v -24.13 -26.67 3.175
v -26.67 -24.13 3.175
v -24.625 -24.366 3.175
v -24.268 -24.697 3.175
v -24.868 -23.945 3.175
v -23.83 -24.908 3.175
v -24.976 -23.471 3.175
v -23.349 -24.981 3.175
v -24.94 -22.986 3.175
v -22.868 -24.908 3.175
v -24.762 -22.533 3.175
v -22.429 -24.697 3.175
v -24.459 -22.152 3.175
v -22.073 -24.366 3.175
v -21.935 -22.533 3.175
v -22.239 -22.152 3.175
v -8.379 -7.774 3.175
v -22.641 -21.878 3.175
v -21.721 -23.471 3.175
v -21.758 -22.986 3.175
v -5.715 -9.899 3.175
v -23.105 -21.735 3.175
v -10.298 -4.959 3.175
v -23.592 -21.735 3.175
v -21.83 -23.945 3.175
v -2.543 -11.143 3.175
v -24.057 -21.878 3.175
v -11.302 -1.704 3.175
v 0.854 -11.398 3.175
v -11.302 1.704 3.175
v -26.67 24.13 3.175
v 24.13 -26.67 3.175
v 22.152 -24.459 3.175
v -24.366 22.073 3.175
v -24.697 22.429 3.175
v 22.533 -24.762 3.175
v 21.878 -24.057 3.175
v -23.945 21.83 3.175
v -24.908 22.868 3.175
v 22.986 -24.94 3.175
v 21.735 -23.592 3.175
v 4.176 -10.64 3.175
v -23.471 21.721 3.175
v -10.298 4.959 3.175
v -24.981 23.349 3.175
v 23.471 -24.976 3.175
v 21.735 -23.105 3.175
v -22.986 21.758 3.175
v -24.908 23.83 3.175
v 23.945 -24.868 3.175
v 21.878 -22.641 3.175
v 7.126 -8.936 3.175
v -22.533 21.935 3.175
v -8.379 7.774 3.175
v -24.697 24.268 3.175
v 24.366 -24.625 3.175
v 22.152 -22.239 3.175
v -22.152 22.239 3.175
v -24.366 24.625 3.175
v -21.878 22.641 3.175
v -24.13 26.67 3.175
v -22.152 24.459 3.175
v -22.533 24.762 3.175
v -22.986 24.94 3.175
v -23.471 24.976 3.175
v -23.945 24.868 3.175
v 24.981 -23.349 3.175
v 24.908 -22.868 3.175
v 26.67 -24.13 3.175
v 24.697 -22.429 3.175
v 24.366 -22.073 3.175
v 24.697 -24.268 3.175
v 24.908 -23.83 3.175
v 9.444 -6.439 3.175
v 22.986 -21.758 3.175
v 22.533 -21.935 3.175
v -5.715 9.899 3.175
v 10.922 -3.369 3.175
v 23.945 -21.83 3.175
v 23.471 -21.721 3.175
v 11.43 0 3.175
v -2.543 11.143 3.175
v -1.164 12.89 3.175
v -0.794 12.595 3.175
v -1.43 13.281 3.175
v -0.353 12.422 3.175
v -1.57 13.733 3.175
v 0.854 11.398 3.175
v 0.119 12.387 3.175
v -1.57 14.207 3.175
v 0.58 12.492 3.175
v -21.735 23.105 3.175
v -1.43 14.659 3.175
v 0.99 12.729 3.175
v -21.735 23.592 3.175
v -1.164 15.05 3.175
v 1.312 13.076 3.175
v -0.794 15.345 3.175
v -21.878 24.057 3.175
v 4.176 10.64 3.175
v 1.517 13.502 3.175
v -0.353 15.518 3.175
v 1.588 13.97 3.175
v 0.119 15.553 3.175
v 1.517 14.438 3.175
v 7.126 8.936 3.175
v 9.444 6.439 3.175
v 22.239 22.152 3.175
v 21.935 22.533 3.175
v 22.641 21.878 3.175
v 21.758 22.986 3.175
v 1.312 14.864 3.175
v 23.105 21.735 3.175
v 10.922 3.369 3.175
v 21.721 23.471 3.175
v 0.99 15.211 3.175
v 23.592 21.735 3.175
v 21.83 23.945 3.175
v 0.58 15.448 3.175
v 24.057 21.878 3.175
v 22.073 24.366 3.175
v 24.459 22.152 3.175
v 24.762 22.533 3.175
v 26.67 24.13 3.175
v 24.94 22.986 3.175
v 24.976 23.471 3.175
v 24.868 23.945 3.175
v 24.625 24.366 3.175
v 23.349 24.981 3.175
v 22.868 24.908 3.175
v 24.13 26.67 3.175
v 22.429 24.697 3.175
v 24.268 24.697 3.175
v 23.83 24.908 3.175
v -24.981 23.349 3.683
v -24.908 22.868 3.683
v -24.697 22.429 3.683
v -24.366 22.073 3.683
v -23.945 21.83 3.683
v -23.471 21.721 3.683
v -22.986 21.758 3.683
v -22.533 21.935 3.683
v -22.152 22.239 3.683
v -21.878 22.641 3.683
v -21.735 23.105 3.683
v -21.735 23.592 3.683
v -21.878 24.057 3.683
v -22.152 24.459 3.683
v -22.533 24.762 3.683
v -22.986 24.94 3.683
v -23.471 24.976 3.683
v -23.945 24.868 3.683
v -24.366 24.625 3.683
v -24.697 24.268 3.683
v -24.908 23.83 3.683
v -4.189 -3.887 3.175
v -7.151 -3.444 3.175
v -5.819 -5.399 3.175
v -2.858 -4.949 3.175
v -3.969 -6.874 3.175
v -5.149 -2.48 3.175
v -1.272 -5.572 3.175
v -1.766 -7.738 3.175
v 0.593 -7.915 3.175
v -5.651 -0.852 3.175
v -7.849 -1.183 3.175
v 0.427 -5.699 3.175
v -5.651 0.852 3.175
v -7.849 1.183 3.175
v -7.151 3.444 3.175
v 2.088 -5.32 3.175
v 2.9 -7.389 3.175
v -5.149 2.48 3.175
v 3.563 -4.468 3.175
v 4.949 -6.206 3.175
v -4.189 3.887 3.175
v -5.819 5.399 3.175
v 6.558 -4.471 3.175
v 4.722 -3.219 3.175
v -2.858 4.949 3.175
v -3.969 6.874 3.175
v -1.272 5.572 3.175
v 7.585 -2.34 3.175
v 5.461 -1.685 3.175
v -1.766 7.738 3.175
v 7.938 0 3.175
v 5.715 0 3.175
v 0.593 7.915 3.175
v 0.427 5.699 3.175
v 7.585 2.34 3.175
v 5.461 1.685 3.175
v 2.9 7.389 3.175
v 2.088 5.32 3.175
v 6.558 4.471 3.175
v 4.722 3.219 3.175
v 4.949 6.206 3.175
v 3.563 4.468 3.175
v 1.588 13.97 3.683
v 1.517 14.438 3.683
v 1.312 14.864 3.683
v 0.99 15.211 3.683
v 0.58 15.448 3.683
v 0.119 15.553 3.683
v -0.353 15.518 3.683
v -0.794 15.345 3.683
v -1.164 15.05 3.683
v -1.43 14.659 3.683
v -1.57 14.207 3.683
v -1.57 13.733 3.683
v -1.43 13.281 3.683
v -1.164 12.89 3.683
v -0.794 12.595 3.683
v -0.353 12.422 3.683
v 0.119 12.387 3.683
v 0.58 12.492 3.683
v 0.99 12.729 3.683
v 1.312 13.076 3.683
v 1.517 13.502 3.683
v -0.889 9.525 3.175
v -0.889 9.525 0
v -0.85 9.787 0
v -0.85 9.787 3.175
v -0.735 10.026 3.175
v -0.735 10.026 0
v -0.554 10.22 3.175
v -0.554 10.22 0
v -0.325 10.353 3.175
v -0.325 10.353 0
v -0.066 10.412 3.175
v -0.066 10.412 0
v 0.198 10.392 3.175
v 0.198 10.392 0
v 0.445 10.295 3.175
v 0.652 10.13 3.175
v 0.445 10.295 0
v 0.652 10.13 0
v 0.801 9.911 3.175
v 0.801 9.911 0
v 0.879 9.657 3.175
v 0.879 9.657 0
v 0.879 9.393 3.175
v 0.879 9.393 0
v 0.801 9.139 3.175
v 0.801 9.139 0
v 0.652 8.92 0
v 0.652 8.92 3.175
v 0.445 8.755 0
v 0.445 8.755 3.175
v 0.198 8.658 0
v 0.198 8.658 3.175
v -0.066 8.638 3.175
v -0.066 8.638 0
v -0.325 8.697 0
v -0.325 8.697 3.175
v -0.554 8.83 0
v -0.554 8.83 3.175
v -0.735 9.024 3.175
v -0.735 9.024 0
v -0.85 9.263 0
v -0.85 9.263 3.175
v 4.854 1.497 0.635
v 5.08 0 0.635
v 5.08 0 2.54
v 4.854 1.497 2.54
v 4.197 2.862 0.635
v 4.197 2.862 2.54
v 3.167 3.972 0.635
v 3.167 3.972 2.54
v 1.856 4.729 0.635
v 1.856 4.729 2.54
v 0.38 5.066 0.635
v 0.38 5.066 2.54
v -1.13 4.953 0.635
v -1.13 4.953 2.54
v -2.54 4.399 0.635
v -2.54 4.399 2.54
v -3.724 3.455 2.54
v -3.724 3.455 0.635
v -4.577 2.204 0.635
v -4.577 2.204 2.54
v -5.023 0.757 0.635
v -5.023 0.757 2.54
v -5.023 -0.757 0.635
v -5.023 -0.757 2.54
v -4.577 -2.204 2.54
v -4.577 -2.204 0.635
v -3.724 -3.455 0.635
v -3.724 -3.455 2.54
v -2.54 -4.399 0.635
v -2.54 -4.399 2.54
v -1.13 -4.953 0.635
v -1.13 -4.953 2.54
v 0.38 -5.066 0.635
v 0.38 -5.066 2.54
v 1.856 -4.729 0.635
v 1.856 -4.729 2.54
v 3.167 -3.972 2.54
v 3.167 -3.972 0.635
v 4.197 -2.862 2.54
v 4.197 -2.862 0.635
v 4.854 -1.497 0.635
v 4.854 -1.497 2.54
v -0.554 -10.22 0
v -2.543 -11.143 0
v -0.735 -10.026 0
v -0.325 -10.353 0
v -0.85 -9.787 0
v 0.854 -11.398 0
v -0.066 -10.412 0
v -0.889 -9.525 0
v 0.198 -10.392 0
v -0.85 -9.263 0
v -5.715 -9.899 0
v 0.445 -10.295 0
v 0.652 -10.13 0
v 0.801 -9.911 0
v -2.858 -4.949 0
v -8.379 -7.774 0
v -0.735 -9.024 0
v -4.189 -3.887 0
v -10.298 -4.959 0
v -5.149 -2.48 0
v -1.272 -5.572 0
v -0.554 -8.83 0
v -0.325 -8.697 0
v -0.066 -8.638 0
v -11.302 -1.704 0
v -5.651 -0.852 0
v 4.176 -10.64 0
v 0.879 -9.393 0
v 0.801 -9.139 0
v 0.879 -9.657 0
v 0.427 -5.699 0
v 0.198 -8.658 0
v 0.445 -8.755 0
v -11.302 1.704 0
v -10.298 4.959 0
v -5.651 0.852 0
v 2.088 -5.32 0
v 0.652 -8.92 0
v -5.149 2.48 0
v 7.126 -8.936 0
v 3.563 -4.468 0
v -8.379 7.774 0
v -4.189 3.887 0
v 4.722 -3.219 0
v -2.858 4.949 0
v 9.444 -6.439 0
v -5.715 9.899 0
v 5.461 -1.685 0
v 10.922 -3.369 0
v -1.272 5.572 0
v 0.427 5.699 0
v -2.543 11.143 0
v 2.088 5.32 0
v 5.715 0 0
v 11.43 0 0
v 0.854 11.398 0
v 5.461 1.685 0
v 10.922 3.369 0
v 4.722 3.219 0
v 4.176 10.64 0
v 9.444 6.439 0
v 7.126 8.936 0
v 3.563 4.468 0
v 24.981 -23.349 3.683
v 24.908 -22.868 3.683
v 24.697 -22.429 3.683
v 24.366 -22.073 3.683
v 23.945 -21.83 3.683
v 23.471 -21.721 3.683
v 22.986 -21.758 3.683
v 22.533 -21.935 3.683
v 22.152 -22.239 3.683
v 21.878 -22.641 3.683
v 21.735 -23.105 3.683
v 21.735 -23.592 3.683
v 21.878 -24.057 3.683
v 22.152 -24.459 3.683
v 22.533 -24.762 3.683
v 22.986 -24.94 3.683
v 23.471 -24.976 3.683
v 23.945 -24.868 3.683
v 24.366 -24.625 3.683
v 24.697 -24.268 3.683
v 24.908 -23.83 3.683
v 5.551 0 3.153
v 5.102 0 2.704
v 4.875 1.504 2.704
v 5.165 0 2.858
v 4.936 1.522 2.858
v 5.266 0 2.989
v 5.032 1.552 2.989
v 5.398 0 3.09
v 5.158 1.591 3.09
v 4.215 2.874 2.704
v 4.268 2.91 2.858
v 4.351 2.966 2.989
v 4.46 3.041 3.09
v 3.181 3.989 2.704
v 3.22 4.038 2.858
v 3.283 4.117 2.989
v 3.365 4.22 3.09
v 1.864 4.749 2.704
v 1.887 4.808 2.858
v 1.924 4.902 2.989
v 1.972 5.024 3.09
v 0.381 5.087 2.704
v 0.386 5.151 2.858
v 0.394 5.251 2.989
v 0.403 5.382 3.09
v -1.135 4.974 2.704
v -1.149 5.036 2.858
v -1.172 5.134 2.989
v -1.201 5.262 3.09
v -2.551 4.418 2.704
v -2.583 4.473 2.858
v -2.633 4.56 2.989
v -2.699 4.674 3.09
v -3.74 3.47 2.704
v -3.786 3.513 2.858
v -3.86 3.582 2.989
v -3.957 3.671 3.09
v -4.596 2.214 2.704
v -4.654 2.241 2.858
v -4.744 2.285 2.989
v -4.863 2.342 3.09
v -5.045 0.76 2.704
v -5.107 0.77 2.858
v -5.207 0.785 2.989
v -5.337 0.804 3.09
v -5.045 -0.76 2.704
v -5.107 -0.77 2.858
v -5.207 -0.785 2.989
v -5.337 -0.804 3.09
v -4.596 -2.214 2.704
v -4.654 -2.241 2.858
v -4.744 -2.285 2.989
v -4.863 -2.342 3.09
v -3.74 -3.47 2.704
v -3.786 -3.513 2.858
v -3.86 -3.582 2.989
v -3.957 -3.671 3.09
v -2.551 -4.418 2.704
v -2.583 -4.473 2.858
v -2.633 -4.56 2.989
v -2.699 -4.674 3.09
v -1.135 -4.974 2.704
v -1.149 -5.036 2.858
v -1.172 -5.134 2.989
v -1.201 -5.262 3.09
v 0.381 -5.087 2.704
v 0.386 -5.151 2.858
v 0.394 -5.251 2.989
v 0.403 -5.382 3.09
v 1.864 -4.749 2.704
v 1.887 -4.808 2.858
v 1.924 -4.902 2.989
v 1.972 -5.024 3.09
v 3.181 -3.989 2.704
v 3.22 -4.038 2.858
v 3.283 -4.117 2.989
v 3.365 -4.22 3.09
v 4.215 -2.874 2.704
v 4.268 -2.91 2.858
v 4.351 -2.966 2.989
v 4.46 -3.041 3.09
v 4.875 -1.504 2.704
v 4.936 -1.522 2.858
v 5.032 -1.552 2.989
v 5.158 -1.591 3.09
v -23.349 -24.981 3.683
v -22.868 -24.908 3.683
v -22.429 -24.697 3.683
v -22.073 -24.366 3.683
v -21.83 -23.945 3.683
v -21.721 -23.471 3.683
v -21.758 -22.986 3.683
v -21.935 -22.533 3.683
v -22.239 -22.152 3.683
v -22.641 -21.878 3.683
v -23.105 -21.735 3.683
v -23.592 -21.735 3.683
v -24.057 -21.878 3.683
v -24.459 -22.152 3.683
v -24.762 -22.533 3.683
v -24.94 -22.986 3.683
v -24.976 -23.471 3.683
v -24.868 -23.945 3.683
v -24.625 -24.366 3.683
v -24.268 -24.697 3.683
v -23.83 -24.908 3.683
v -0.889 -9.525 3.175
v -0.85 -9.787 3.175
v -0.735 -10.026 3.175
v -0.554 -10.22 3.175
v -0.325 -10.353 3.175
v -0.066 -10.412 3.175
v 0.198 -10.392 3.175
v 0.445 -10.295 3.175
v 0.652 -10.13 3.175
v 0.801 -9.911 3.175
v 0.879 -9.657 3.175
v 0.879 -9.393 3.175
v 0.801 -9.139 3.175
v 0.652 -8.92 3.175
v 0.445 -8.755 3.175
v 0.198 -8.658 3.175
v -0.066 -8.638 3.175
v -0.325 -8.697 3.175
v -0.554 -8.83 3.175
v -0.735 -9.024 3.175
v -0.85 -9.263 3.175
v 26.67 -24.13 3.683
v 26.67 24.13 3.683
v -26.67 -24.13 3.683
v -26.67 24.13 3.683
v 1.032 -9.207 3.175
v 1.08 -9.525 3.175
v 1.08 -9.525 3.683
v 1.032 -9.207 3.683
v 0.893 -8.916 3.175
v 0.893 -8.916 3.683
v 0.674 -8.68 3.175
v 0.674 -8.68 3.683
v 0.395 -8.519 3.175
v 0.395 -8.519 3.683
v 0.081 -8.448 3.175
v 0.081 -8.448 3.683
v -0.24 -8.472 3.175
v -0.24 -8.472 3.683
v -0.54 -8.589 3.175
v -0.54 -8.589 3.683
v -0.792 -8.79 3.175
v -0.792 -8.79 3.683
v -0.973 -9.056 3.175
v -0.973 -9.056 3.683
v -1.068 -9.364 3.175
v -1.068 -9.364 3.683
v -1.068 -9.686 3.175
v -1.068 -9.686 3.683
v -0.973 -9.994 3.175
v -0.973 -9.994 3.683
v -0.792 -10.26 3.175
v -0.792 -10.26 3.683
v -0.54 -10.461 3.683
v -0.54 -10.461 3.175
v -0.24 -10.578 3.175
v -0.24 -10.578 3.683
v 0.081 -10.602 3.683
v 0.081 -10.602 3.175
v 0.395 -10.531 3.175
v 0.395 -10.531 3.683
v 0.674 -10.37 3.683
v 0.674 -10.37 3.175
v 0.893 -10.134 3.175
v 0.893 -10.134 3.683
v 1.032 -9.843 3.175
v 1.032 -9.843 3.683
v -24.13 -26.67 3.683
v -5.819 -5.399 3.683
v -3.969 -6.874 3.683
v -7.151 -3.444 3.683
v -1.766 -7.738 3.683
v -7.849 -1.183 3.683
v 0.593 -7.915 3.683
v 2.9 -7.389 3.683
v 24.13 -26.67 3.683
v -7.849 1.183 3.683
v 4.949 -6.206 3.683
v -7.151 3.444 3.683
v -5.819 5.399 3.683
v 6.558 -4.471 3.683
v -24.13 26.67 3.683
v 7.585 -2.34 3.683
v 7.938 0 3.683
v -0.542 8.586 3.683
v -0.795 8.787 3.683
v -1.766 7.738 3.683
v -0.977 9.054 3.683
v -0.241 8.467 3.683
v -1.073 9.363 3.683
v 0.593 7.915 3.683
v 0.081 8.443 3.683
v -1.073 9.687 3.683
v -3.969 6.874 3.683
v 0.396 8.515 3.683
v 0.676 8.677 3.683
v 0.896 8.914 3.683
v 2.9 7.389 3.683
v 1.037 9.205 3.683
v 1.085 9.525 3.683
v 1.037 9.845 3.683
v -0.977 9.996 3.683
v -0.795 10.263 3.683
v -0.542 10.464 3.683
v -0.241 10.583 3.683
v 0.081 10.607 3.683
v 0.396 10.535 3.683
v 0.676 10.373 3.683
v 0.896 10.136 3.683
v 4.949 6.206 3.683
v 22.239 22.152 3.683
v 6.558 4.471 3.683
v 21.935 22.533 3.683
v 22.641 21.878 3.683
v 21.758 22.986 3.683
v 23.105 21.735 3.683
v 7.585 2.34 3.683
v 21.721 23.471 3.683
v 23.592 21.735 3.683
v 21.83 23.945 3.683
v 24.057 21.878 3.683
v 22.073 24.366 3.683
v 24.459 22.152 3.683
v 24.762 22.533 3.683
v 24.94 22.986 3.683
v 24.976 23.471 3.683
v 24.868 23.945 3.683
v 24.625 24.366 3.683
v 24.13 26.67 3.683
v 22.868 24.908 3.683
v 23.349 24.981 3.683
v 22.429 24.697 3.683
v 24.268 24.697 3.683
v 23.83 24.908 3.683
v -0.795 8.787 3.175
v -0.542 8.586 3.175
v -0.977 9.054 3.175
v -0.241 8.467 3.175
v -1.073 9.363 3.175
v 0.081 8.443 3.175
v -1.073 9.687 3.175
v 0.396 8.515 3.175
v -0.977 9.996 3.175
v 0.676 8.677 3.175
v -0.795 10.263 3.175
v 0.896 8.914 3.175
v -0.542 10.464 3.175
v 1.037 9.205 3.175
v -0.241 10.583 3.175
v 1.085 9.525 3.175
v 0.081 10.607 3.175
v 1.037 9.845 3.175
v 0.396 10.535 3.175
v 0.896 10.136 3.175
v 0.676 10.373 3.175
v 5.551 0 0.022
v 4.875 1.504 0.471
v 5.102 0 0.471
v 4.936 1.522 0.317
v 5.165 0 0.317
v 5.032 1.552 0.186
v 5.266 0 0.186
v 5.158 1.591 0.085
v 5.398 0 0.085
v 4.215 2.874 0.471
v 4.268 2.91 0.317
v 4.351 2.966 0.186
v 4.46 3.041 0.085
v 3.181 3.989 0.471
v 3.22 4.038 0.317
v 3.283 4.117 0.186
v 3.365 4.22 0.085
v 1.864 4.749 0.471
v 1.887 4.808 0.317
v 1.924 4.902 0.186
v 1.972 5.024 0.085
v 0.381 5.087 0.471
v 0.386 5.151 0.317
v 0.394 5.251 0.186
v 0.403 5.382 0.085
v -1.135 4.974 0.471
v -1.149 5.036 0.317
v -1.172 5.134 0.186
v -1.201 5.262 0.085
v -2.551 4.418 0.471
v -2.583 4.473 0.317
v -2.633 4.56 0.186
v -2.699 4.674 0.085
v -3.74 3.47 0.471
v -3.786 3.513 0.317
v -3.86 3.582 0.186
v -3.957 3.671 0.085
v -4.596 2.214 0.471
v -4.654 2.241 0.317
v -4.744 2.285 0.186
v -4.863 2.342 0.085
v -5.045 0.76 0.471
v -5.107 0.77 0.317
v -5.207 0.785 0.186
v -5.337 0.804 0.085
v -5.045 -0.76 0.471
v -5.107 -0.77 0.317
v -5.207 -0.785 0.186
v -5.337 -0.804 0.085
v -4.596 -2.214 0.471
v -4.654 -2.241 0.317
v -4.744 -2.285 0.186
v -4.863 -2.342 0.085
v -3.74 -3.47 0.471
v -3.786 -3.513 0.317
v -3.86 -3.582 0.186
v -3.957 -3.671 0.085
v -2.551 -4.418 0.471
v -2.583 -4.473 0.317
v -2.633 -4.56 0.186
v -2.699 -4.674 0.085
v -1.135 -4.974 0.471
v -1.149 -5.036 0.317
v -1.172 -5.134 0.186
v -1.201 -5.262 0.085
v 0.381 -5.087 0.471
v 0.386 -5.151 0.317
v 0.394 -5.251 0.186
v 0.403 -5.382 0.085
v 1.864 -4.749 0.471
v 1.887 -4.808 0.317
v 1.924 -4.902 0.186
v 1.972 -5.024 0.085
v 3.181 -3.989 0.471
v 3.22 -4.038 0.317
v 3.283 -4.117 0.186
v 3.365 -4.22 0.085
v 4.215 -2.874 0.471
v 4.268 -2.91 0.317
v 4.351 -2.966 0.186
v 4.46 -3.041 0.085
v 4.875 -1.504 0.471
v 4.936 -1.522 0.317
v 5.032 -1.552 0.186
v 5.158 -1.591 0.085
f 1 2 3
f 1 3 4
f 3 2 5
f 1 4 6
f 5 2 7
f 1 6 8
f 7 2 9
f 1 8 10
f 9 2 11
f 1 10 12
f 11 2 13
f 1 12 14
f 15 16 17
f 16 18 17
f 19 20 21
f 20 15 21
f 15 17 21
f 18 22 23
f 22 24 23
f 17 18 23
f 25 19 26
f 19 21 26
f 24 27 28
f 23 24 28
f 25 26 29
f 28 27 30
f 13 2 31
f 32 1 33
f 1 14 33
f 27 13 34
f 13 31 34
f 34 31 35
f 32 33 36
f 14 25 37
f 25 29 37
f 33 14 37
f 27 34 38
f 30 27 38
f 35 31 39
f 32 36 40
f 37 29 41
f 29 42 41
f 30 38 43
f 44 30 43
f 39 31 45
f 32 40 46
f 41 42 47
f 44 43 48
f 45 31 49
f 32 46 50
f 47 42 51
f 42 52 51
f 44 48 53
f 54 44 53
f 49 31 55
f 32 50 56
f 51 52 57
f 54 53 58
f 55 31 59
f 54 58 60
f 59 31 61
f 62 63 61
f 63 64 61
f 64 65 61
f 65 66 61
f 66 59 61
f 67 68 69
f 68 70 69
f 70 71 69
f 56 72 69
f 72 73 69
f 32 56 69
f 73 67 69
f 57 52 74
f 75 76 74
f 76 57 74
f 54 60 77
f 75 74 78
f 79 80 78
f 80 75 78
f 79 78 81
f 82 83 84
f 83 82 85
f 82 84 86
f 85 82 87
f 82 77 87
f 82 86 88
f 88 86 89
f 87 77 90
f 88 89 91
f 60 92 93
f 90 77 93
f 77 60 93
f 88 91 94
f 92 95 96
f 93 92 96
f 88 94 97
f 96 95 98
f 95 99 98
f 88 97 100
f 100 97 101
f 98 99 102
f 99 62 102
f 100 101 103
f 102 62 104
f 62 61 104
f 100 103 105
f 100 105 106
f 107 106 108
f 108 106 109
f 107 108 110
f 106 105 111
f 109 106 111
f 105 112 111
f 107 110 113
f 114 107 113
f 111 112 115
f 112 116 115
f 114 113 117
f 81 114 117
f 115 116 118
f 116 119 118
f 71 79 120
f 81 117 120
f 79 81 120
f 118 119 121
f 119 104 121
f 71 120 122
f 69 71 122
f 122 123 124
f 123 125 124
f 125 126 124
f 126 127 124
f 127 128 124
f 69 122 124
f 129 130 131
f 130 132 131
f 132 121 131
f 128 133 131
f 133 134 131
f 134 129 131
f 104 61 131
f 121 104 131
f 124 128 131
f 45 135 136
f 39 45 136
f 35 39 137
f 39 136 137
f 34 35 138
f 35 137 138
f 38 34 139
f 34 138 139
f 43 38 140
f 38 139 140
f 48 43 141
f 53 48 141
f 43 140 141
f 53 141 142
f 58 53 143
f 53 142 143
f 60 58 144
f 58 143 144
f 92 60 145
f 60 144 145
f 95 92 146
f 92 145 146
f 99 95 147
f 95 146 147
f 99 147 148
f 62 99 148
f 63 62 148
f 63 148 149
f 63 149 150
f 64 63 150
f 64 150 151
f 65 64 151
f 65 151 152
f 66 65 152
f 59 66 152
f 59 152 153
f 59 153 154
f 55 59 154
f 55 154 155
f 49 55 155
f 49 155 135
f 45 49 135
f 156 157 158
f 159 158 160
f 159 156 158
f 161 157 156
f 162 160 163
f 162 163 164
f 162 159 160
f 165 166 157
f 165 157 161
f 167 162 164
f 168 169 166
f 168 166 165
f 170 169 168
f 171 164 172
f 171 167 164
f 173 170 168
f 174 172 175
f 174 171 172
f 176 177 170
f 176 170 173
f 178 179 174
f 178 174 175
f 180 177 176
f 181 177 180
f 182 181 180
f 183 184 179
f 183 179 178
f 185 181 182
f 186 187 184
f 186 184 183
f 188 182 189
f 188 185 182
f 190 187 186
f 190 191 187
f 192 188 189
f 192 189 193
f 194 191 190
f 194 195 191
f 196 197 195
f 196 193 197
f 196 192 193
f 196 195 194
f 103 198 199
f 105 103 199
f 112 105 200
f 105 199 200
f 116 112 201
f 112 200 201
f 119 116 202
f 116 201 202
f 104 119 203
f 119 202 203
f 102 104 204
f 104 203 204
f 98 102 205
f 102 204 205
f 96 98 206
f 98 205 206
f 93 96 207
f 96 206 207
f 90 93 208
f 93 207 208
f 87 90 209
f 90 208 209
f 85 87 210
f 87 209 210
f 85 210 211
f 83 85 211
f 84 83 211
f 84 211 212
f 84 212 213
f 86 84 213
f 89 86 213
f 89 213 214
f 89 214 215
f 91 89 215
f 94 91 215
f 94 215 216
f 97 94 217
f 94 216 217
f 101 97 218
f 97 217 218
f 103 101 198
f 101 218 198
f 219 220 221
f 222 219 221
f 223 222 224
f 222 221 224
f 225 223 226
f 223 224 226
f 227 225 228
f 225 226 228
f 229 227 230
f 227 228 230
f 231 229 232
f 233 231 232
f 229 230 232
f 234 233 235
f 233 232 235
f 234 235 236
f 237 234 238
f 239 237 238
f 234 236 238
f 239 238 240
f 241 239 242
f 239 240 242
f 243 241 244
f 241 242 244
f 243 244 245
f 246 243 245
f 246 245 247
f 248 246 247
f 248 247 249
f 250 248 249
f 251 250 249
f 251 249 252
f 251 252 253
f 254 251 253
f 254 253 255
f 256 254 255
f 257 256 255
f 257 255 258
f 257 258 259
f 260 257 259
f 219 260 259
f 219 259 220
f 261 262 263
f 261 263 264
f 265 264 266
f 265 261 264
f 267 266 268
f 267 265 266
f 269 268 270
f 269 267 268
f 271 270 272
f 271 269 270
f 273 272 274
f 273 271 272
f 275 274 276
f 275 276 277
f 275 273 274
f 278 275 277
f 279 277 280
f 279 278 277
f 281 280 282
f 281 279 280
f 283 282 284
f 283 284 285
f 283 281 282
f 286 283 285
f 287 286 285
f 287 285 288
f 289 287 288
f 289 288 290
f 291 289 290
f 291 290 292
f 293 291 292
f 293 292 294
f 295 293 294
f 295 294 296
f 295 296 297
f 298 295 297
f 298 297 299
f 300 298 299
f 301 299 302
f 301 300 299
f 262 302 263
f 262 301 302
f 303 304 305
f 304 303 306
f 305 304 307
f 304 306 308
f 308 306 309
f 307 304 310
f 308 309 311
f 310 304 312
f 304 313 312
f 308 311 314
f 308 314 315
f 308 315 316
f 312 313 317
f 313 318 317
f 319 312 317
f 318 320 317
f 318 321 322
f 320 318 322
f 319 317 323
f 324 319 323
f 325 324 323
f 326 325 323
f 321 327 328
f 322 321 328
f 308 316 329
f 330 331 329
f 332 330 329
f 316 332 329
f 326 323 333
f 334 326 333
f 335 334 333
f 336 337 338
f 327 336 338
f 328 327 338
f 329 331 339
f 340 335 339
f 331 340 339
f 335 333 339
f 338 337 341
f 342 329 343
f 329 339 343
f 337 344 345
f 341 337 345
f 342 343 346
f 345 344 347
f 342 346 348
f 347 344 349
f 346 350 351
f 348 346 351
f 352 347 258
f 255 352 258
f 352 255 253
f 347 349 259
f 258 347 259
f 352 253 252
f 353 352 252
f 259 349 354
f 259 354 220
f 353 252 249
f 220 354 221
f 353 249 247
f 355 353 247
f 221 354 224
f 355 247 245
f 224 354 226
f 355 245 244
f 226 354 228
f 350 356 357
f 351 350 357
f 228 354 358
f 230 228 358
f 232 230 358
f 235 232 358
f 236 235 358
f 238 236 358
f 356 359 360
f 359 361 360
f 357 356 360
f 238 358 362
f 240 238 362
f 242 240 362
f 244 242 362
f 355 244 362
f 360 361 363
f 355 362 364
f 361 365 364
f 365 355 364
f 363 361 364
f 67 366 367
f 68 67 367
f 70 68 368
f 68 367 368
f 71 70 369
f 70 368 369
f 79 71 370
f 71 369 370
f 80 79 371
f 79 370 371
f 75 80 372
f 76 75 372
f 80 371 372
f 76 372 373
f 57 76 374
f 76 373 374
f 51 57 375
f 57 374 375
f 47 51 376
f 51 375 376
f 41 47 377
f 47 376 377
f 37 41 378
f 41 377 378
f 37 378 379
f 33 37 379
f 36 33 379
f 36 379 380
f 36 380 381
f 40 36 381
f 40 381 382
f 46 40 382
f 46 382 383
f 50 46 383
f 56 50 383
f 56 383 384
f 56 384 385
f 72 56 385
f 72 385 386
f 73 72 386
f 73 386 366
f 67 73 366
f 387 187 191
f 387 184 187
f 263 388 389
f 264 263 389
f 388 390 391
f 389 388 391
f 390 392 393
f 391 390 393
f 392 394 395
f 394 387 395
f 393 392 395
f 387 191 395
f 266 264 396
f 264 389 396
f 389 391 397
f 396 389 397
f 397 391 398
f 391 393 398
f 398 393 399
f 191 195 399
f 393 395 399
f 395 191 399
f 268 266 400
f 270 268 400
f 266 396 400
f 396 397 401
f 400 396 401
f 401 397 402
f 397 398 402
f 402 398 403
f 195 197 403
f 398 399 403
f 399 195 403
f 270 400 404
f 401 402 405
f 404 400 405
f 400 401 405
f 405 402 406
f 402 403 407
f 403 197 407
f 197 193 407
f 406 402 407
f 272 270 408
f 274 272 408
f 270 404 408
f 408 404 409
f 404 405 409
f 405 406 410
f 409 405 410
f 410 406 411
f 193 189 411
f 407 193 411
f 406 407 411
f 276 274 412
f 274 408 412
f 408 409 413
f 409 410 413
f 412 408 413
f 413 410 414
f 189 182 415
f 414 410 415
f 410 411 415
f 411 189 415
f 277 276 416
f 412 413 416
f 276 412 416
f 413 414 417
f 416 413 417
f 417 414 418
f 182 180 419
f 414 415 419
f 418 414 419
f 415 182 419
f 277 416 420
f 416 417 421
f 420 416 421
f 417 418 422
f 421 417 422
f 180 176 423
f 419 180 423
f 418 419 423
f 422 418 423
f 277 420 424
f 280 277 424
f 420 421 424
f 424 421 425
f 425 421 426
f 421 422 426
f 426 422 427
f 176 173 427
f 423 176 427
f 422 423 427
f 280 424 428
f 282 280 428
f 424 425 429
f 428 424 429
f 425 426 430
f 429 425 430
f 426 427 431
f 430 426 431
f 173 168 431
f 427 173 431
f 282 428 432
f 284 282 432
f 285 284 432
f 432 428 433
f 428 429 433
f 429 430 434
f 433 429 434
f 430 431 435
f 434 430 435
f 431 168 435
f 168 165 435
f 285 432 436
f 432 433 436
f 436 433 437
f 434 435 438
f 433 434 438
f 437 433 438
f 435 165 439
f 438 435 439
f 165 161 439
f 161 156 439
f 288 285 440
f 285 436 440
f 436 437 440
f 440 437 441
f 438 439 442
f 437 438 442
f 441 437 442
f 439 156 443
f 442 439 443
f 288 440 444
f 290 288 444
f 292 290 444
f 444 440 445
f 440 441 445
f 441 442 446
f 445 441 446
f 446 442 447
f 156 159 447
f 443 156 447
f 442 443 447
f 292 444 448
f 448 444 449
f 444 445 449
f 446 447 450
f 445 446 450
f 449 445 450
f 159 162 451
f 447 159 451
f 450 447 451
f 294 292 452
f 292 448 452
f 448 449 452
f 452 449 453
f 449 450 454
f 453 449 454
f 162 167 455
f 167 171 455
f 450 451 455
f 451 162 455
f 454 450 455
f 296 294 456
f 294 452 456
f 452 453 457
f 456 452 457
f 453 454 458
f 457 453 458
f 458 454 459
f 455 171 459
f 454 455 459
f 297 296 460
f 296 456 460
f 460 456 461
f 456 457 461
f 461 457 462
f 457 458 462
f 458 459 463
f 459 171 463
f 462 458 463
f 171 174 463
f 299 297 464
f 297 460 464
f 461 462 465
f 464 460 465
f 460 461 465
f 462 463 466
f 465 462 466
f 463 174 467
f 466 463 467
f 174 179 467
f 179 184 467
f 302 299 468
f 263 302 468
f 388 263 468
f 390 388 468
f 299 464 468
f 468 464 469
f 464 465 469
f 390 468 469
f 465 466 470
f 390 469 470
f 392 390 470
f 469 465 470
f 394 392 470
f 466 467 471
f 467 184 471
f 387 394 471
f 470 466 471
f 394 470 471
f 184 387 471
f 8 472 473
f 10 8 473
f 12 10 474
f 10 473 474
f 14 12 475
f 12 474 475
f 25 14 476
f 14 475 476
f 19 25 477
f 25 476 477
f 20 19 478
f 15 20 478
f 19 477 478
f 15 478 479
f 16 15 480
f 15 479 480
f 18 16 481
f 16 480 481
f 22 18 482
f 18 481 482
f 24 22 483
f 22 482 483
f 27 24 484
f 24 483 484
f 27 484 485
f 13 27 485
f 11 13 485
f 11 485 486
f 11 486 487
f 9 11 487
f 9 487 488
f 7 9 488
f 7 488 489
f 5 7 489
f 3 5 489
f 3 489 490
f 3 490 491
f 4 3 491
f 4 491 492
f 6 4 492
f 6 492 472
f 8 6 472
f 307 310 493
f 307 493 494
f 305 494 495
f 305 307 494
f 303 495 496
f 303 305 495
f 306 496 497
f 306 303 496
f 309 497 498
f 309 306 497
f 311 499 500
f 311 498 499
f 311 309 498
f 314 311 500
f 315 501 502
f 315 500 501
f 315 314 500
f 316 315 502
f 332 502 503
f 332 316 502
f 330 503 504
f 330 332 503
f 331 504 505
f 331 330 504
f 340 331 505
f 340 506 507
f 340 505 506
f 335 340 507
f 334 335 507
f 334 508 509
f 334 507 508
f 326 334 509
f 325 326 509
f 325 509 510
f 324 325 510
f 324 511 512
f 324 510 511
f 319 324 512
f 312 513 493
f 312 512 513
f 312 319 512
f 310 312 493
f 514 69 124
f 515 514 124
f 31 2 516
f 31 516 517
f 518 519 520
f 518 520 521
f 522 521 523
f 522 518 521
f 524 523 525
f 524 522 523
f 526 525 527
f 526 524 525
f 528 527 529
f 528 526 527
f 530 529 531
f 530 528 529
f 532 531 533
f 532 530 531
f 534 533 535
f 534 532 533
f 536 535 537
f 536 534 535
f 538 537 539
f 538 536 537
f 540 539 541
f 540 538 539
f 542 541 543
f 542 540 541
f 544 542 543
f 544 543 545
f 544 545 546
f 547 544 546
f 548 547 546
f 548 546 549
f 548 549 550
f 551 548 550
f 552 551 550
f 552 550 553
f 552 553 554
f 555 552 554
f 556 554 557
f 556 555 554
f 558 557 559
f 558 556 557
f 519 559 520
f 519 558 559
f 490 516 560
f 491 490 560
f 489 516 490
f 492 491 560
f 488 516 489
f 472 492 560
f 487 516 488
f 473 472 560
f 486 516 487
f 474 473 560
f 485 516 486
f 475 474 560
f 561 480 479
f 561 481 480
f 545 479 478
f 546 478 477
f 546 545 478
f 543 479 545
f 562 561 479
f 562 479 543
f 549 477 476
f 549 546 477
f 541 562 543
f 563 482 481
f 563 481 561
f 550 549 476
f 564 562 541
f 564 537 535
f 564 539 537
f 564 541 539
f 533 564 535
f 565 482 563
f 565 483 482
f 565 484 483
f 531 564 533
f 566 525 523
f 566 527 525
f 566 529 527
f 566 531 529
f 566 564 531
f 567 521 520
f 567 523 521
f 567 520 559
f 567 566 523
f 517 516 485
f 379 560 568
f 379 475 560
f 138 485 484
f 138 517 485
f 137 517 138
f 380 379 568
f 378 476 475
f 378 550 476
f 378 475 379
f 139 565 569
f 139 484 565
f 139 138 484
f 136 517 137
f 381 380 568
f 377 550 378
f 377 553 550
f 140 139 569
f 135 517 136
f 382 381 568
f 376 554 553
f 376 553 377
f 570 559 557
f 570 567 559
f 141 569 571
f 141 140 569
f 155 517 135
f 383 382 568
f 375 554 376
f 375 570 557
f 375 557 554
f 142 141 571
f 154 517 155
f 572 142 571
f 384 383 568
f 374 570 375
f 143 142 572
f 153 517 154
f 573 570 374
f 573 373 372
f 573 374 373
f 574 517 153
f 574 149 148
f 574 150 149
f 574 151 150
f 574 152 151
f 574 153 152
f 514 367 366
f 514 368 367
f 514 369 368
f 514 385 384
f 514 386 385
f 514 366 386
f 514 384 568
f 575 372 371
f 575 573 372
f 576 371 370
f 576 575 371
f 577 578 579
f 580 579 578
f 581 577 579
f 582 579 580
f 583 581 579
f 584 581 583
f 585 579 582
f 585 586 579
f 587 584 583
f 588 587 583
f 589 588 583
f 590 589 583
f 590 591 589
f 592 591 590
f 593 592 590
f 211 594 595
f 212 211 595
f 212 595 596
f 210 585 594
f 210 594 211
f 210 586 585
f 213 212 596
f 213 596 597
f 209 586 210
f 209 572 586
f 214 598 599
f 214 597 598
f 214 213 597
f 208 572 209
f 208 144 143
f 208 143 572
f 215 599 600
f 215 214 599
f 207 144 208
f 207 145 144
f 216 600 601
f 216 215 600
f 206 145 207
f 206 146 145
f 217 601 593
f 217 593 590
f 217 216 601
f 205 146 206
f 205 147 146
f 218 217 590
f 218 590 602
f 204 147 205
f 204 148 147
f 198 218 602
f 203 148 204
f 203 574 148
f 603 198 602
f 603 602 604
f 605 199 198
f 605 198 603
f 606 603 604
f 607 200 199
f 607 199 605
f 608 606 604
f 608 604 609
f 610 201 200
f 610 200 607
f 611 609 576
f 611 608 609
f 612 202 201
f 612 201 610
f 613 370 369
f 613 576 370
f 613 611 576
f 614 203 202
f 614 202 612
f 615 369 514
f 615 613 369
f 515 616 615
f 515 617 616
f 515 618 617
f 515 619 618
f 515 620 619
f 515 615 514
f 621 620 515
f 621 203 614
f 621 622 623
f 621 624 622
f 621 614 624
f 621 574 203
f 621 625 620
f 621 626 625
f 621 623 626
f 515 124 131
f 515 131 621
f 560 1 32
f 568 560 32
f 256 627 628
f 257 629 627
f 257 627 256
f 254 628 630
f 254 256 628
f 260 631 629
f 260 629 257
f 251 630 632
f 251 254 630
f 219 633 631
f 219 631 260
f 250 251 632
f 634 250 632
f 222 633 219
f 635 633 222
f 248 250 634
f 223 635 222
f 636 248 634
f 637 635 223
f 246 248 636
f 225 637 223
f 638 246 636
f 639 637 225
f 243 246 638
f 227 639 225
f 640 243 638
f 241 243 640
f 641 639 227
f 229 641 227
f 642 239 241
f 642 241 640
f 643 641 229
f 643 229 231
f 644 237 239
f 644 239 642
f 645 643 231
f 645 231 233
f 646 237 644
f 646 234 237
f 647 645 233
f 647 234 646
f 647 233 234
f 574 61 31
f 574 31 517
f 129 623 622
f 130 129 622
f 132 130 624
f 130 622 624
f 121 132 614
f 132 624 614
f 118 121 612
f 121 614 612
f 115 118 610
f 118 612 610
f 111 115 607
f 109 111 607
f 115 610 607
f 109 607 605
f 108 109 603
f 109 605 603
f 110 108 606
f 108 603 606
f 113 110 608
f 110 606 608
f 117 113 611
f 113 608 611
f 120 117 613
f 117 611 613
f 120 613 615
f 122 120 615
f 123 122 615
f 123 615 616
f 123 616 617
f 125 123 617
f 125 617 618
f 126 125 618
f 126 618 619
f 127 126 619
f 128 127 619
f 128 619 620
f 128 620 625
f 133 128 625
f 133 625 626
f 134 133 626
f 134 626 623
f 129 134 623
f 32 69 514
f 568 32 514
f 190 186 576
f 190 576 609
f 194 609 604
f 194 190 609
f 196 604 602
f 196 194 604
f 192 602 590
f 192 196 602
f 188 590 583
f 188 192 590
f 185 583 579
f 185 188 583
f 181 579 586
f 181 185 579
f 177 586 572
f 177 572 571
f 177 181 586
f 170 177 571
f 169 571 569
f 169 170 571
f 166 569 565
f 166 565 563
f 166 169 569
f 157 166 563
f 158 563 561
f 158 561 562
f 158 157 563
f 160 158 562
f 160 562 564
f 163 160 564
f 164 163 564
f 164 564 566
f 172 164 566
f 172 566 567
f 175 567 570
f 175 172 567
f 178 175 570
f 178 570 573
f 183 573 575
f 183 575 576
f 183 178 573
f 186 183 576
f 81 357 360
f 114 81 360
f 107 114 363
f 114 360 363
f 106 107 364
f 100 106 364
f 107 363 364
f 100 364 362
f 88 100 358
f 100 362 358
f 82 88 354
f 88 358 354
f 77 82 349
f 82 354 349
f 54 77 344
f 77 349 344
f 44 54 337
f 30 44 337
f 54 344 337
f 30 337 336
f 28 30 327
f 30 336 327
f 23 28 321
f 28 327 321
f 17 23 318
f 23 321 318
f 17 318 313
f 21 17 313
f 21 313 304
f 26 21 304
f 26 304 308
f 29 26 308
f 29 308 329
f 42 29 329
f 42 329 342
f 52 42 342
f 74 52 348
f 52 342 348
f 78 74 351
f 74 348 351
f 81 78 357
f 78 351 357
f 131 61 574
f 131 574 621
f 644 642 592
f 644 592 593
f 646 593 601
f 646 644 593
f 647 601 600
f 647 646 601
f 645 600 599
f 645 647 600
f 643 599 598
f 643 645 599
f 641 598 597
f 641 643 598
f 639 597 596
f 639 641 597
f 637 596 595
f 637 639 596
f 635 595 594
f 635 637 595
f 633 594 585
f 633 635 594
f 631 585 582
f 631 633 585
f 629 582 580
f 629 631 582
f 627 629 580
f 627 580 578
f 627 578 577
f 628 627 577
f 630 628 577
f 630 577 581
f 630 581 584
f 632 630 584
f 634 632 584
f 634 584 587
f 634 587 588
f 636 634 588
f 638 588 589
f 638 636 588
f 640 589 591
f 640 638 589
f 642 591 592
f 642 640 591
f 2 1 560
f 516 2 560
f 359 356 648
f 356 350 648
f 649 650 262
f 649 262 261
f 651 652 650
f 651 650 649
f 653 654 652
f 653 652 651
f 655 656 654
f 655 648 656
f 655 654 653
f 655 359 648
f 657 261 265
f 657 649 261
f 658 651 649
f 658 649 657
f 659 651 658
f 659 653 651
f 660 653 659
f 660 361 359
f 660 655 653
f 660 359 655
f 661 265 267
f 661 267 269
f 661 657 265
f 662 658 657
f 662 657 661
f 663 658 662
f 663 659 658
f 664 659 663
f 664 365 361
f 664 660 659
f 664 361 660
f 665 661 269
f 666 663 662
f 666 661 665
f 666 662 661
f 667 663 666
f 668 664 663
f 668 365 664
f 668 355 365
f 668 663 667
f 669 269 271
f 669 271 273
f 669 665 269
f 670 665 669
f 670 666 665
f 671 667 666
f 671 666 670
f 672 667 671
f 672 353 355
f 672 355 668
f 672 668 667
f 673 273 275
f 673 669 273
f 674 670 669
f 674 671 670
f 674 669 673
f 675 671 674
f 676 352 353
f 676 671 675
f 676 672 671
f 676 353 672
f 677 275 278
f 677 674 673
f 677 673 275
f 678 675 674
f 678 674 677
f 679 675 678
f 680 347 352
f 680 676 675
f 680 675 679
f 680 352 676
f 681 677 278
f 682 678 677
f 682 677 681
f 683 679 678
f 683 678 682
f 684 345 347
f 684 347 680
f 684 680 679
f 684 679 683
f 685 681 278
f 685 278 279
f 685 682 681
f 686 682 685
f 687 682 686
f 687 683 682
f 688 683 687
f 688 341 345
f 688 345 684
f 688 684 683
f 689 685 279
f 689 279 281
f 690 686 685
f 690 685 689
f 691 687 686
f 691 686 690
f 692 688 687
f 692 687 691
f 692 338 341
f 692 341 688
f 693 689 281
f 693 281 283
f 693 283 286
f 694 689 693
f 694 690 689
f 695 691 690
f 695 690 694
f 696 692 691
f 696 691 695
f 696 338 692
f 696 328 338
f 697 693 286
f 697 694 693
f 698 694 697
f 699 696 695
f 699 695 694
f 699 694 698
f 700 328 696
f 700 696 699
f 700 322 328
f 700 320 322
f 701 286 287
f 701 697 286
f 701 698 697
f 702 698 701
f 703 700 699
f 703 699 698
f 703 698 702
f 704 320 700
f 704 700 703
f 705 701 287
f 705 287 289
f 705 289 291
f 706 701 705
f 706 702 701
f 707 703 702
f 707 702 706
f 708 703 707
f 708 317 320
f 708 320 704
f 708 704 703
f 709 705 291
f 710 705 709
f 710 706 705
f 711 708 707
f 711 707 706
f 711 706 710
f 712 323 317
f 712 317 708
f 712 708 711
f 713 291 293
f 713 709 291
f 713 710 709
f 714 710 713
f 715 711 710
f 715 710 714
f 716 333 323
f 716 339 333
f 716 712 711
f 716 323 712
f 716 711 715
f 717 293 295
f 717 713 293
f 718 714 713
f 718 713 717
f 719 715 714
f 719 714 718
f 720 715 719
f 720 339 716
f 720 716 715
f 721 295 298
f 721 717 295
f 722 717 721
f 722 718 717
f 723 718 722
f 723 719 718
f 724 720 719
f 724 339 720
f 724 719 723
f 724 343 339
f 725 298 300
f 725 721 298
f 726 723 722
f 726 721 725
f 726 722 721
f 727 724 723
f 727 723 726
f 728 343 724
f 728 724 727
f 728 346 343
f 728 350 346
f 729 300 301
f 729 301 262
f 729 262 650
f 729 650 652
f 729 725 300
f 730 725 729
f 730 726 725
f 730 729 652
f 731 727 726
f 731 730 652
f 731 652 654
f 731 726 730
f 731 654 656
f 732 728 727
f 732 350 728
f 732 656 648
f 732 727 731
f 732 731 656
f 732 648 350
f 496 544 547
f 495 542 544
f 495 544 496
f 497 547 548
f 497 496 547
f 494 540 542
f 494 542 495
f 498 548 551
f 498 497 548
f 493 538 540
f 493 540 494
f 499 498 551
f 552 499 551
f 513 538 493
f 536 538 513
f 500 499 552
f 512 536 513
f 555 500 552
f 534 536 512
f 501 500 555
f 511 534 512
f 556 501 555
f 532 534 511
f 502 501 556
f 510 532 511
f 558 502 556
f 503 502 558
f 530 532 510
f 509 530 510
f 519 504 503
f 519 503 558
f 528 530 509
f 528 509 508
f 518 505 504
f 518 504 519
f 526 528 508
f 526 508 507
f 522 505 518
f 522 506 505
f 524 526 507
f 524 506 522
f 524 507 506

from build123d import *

# Parameters (mm, degrees)
SKETCH1_R             = 11.43
SKETCH1_R_2           = 5.08
BOSS_EXTRUDE1_DEPTH   = 3.175
FILLET1_R             = 0.635
F_2_56_TAPPED_HOLE1_D = 1.778
SKETCH4_W             = 53.34
SKETCH4_H             = 53.34
SKETCH4_R             = 7.9375
SKETCH4_R_2           = 1.084817848
SKETCH4_R_3           = 1.08040081
BOSS_EXTRUDE2_DEPTH   = 0.508
F_4_CLEARANCE_HOLE1_D = 3.2639
CIRPATTERN1_COUNT     = 4
SKETCH9_R             = 1.5875
CUT_EXTRUDE1_DEPTH    = 0.508
CHAMFER1_SIZE         = 2.54


with BuildPart() as part:
    # Sketch1 → Boss-Extrude1 (new body)
    with BuildSketch(Plane.XY):
        Circle(SKETCH1_R)
        Circle(SKETCH1_R_2, mode=Mode.SUBTRACT)
    extrude(amount=BOSS_EXTRUDE1_DEPTH)

    # Fillet1
    fillet1_edges = [part.edges().sort_by_distance(p)[0] for p in [
        (-5.08, 0, 0),
        (-5.08, 0, 3.175),
    ]]
    fillet(fillet1_edges, radius=FILLET1_R)

    # #2-56 Tapped Hole1 (through all)
    with Locations(Plane.XY.offset(3.175)):
        with Locations((0, 9.525)):
            f_2_56_tapped_hole1 = Hole(F_2_56_TAPPED_HOLE1_D / 2)

    # Mirror1: #2-56 Tapped Hole1 across plane
    add(f_2_56_tapped_hole1.mirror(Plane.ZX), mode=Mode.SUBTRACT)

    # Sketch4 → Boss-Extrude2 (add)
    with BuildSketch(Plane.XY.offset(3.175)):
        Rectangle(SKETCH4_W, SKETCH4_H)
        Circle(SKETCH4_R, mode=Mode.SUBTRACT)
        with Locations((0, 9.525)):
            Circle(SKETCH4_R_2, mode=Mode.SUBTRACT)
        with Locations((0, -9.525)):
            Circle(SKETCH4_R_3, mode=Mode.SUBTRACT)
    extrude(amount=BOSS_EXTRUDE2_DEPTH)

    # #4 Clearance Hole1 (through all)
    with Locations(Plane(origin=(0, 0, 3.175), x_dir=(-1, 0, 0), z_dir=(0, 0, -1))):
        with Locations((-23.348665915, -23.348665915)):
            f_4_clearance_hole1 = Hole(F_4_CLEARANCE_HOLE1_D / 2)

    # CirPattern1: #4 Clearance Hole1 ×4 about axis
    cirpattern1_axis = Axis((0, 0, 0), (0, 0, 1))
    for i in range(1, CIRPATTERN1_COUNT):
        add(f_4_clearance_hole1.rotate(cirpattern1_axis, i * 360 / CIRPATTERN1_COUNT), mode=Mode.SUBTRACT)

    # Sketch9 → Cut-Extrude1 (cut)
    with BuildSketch(Plane.XY.offset(3.683)):
        with Locations((0, 13.97)):
            Circle(SKETCH9_R)
    extrude(amount=-CUT_EXTRUDE1_DEPTH, mode=Mode.SUBTRACT)

    # Chamfer1
    chamfer1_edges = [part.edges().sort_by_distance(p)[0] for p in [
        (-26.67, 26.67, 3.429),
        (-26.67, -26.67, 3.429),
        (26.67, -26.67, 3.429),
        (26.67, 26.67, 3.429),
    ]]
    chamfer(chamfer1_edges, length=CHAMFER1_SIZE)


solid = part.part
